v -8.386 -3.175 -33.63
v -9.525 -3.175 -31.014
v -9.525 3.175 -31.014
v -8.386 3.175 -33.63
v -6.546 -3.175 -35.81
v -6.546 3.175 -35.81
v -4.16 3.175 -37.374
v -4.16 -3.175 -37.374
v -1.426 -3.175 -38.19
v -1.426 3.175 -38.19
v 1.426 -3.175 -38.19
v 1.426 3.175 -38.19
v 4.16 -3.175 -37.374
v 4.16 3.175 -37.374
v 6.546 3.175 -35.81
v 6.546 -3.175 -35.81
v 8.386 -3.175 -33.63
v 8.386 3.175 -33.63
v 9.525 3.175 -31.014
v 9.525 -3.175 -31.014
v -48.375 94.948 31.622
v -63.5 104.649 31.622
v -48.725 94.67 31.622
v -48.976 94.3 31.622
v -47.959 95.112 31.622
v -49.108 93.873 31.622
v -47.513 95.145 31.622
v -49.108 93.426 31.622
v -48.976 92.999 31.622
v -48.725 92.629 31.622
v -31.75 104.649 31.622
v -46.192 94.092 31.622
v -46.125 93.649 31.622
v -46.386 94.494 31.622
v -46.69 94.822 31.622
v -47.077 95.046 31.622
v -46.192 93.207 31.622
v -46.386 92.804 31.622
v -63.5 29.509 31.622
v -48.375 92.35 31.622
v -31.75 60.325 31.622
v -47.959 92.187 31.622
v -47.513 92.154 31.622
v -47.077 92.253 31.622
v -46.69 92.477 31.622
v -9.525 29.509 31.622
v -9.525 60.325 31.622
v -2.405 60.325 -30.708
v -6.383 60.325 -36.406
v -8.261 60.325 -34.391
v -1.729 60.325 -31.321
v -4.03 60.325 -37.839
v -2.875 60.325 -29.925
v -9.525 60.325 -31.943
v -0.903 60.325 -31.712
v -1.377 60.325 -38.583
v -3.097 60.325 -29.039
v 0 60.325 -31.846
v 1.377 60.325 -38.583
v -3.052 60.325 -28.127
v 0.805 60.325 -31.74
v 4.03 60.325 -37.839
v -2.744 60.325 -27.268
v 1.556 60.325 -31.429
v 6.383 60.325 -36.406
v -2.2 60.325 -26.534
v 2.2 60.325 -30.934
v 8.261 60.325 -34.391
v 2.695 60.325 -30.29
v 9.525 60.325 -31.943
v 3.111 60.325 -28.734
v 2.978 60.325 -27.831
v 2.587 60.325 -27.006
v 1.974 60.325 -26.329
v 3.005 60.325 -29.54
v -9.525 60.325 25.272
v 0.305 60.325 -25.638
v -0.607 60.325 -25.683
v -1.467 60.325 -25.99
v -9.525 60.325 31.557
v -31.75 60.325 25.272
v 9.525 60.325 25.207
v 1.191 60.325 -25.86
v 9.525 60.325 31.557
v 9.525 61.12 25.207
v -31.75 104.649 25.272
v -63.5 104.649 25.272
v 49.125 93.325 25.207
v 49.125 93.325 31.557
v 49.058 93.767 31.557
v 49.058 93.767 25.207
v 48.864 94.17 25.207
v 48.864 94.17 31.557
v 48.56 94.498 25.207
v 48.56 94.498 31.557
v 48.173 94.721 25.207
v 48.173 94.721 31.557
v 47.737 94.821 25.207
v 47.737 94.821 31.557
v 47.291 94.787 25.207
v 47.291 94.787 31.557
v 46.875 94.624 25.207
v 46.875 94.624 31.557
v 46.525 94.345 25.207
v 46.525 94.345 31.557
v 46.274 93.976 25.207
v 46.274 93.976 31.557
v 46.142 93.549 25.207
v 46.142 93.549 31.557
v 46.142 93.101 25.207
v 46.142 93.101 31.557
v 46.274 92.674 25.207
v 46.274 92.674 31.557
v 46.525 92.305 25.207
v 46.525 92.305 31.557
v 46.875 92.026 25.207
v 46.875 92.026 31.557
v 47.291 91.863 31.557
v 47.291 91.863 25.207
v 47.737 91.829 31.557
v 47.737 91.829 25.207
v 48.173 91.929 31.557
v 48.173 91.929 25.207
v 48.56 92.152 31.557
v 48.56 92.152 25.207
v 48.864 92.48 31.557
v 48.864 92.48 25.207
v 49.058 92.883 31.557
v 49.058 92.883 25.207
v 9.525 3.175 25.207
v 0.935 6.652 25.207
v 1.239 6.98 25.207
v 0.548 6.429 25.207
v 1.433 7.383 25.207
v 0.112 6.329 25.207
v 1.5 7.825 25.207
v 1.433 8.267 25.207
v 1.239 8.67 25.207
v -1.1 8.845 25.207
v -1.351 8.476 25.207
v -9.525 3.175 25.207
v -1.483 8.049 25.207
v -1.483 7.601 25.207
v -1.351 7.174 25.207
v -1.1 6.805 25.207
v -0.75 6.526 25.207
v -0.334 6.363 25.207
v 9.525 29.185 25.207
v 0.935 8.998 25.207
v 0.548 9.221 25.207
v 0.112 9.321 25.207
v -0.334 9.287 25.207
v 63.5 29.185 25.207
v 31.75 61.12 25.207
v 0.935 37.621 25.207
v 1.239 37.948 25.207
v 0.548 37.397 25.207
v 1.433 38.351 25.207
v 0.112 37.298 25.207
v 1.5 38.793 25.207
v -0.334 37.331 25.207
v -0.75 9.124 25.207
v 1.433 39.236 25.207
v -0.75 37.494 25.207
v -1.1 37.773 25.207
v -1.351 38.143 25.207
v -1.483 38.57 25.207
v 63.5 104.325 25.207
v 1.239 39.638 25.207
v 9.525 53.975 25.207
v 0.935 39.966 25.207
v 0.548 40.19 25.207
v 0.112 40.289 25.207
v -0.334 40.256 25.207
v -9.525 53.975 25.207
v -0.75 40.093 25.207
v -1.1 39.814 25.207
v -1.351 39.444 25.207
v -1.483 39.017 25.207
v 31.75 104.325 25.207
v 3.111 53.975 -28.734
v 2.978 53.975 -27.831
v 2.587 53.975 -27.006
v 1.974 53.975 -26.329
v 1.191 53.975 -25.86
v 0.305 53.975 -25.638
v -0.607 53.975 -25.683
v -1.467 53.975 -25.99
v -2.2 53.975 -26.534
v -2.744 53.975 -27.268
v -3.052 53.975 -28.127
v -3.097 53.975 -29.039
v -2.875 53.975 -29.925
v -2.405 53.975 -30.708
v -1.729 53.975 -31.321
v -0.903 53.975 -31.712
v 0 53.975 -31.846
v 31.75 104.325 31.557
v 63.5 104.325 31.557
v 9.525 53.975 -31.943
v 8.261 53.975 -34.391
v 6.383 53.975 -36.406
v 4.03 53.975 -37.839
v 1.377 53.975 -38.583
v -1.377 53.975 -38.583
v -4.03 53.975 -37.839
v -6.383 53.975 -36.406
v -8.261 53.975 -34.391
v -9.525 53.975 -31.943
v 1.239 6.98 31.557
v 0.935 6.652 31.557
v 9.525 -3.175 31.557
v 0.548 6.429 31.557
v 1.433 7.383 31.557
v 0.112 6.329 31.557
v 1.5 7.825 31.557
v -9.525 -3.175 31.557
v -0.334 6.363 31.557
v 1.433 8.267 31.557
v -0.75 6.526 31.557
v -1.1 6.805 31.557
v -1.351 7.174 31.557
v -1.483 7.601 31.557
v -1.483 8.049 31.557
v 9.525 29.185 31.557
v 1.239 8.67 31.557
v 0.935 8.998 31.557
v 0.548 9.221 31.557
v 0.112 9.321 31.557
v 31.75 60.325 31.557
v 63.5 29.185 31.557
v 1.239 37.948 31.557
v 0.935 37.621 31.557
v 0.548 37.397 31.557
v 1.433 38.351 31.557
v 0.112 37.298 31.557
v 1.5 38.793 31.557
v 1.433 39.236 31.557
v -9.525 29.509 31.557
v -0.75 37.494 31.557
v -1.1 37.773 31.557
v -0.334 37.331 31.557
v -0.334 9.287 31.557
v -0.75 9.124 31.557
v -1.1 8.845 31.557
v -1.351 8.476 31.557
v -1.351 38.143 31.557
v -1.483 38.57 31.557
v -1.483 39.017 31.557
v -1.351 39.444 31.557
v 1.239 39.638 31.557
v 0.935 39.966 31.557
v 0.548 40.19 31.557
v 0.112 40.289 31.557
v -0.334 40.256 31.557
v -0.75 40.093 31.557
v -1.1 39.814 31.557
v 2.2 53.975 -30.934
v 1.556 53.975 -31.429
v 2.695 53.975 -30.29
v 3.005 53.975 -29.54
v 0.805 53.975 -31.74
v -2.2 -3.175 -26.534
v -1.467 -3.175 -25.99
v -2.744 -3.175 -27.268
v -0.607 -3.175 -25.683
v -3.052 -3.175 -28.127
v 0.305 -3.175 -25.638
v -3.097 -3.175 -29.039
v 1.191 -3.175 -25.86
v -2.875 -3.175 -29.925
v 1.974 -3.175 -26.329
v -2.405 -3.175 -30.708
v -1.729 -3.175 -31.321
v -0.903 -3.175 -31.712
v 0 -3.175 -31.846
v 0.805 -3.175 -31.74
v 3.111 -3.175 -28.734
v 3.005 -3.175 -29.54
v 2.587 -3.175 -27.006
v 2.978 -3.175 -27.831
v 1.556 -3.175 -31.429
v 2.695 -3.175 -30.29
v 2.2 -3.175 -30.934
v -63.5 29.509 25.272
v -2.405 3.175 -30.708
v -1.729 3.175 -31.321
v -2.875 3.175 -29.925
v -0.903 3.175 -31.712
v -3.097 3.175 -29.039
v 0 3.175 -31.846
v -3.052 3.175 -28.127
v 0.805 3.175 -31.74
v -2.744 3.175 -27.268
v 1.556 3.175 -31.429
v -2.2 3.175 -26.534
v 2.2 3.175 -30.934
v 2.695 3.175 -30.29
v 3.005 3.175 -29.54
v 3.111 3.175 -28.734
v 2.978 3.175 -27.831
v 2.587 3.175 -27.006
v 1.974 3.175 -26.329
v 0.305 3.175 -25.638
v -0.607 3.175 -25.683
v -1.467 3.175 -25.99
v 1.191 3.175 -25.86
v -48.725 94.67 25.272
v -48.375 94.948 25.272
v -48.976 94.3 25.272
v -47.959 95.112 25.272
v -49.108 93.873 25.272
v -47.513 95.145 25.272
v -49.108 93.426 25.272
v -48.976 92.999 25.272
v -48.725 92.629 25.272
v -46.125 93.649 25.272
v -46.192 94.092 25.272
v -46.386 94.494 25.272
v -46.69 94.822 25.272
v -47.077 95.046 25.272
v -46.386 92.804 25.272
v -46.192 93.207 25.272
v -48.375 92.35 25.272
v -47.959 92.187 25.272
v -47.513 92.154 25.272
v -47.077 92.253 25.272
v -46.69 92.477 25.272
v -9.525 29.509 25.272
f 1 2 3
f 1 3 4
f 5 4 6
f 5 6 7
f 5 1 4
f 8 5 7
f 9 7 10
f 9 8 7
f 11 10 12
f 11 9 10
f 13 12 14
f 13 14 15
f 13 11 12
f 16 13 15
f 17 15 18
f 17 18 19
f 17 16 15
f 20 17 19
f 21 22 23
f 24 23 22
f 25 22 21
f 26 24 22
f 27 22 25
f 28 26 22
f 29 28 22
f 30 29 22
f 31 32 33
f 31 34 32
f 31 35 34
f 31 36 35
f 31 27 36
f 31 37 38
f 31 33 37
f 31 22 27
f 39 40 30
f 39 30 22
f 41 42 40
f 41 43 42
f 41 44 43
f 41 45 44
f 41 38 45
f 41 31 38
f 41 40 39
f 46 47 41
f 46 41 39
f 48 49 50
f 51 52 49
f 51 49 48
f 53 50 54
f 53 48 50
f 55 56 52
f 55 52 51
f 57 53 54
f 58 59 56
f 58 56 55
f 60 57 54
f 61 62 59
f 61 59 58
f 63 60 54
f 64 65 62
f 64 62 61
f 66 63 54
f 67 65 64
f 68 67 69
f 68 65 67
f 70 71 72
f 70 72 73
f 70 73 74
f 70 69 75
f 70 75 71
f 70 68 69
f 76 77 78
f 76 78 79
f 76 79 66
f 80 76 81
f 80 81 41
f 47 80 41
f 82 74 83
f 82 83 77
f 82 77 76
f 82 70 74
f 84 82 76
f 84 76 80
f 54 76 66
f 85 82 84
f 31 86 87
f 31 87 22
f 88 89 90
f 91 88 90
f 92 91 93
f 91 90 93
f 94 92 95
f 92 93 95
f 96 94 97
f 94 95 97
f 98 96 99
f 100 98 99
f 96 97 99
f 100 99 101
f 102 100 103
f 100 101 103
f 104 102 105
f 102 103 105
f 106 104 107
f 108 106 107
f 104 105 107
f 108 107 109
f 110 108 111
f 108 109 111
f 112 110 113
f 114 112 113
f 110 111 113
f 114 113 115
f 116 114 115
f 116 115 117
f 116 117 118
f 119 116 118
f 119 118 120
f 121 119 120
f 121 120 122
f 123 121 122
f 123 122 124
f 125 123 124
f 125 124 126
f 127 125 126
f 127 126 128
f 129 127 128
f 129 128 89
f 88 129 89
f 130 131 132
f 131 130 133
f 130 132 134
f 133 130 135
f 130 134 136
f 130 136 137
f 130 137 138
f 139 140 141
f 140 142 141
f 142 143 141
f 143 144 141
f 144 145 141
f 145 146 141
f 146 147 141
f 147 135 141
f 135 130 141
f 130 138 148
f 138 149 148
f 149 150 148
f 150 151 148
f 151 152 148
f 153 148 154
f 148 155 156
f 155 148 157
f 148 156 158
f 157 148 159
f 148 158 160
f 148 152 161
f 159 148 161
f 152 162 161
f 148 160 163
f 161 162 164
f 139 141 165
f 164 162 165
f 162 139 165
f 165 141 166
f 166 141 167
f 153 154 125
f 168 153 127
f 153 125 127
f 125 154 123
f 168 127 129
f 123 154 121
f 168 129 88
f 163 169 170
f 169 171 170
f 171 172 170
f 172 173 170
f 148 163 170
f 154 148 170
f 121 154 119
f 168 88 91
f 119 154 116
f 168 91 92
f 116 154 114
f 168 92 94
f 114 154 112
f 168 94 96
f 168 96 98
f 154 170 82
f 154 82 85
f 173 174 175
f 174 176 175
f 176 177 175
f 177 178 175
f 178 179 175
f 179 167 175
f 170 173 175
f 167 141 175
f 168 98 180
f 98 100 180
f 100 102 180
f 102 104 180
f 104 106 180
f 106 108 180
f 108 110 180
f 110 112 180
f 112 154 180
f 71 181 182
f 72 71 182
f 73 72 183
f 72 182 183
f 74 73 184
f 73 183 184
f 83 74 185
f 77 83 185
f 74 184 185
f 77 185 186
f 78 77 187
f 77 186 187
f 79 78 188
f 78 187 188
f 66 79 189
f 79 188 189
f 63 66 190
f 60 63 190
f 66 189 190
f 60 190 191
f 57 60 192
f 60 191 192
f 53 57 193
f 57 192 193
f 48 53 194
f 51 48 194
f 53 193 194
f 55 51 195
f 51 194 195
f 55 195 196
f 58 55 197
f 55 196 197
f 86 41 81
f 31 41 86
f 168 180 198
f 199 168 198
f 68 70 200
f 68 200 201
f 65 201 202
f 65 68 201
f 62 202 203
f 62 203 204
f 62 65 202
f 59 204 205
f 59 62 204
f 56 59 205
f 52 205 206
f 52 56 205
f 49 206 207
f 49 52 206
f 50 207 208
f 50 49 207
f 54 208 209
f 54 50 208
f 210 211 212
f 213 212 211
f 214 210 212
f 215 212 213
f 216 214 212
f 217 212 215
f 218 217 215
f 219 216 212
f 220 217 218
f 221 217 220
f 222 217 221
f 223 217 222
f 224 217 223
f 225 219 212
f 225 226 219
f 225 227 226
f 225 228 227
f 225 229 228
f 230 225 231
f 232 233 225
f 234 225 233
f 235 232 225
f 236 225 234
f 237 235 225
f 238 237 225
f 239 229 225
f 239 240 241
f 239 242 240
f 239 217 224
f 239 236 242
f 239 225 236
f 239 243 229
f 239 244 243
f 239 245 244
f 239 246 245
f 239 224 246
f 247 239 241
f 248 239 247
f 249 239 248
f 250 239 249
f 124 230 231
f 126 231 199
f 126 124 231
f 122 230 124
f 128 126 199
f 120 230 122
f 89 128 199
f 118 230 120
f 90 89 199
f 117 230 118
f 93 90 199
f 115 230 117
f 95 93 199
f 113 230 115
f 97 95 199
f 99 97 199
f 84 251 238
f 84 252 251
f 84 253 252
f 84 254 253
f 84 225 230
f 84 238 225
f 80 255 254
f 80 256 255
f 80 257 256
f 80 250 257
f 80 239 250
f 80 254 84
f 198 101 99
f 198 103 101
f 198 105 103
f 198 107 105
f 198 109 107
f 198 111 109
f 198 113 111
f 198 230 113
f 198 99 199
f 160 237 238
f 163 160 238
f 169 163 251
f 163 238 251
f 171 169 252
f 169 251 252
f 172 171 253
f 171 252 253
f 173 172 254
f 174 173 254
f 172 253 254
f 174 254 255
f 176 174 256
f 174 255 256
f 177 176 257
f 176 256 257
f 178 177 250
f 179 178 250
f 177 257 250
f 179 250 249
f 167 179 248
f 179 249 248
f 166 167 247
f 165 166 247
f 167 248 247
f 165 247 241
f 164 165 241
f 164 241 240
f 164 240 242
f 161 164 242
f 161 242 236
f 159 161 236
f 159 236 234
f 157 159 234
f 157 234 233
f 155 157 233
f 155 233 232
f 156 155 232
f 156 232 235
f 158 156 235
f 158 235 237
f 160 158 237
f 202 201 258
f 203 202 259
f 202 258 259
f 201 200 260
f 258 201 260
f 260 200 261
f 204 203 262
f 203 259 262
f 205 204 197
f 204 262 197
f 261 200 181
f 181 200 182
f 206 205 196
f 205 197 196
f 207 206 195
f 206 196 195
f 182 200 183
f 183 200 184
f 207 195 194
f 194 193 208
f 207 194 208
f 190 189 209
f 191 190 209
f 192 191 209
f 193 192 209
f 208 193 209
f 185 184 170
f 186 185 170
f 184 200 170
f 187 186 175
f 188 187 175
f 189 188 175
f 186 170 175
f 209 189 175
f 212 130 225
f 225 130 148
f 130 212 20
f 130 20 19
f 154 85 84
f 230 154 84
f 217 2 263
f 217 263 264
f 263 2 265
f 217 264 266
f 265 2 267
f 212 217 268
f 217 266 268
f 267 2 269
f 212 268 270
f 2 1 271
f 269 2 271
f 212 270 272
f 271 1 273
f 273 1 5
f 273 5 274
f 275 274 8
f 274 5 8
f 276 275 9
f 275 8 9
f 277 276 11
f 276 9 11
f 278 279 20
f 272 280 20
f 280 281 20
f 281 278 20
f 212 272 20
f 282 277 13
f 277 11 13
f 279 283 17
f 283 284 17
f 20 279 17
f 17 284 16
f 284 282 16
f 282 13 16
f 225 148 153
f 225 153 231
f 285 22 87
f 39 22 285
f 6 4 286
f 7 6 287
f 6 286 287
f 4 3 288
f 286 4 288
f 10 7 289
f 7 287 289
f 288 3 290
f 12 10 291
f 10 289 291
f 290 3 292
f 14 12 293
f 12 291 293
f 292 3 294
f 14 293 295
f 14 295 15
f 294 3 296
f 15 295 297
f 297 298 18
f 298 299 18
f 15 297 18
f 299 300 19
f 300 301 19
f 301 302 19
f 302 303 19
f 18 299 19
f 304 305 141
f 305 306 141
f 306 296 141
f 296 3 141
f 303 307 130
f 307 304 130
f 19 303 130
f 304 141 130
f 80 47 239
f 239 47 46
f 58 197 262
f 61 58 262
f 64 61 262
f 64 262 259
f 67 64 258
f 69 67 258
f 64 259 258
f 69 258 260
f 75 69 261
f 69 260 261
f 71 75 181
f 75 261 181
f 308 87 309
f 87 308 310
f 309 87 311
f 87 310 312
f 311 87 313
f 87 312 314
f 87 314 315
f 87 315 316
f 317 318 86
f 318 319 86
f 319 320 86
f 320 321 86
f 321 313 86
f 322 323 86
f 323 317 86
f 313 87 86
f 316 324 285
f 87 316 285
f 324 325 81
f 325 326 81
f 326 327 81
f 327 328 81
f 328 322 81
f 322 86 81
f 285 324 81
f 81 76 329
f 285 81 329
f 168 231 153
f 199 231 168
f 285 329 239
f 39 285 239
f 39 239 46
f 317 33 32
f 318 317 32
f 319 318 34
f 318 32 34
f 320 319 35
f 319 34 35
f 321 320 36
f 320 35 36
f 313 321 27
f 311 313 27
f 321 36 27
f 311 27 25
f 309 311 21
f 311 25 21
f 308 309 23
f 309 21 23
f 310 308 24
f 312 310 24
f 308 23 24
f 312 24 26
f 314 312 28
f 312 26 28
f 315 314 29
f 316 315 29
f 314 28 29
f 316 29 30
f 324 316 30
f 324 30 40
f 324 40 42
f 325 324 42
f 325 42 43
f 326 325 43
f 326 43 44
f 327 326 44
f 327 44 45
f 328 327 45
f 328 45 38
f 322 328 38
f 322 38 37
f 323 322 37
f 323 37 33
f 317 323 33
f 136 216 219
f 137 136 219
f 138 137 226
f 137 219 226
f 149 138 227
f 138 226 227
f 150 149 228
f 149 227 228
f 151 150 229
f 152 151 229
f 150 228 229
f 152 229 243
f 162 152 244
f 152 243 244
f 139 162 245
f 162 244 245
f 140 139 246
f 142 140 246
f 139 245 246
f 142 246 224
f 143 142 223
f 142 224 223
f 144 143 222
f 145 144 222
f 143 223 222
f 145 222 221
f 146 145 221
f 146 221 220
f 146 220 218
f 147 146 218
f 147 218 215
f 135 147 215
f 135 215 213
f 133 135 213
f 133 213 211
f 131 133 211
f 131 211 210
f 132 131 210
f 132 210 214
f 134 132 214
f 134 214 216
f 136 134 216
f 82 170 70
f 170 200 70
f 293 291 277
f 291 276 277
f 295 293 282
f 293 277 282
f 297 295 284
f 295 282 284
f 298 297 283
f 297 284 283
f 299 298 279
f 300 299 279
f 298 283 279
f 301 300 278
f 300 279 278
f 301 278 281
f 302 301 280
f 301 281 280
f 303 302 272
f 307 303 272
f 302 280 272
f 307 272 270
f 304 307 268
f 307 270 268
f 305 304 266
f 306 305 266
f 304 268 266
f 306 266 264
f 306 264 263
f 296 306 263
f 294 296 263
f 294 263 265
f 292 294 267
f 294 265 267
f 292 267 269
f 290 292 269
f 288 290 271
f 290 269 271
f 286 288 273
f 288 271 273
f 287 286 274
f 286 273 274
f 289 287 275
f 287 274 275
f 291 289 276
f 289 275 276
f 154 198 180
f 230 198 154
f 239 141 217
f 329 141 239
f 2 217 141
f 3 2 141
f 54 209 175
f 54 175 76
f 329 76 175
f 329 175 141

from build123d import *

# Parameters (mm, degrees)
F1_DEPTH  = 3.175
F2_DEPTH  = 3.175
F4_DEPTH  = 25.4
F5_DEPTH  = 25.4
F6_W      = 19.05
F6_H      = 63.5
F7_DEPTH  = 6.35
F9_DEPTH  = 6.35
F10_DEPTH = 2540
F11_R     = 1.5
F12_DEPTH = 25.4
F13_W     = 75.1403903484
F13_H     = 6.35
F14_DEPTH = 53.975
F15_R     = 1.5
F16_DEPTH = 25
F17_W     = 75.1403903484
F17_H     = 6.35
F18_DEPTH = 53.975
F19_R     = 1.5
F20_DEPTH = 25
F22_DEPTH = 22.225
F23_W     = 44.3243741632
F23_H     = 6.35
F24_DEPTH = 22.225


# Not quite as in the source:
# - a length typed as a fraction of an inch, garbled in the dataset ("3 / 203.2 mm" for 3/8 in), is restored


with BuildPart() as f1:
    # F0 (on Front) → F1 (new body)
    with BuildSketch(Plane.XZ):
        with BuildLine():
            Line((9.525, 25.206619263), (-9.525, 25.206619263))
            Line((-9.525, 25.206619263), (-9.525, -31.0143064708))
            ThreePointArc((-9.525, -31.0143064708), (0, -38.293380737), (9.525, -31.0143064708))
            Line((9.525, -31.0143064708), (9.525, 25.206619263))
        make_face()
    extrude(amount=F1_DEPTH)

    # F0 (on Front) → F2 (join)
    with BuildSketch(Plane.XZ):
        with BuildLine():
            Line((9.525, 25.206619263), (-9.525, 25.206619263))
            Line((-9.525, 25.206619263), (-9.525, -31.0143064708))
            ThreePointArc((-9.525, -31.0143064708), (0, -38.293380737), (9.525, -31.0143064708))
            Line((9.525, -31.0143064708), (9.525, 25.206619263))
        make_face()
    extrude(amount=-F2_DEPTH)

    # F3 (on Front) → F4 (cut)
    with BuildSketch(Plane.XZ):
        with BuildLine():
            ThreePointArc((0, -31.845793884), (2.2001627497, -30.9344566337), (3.1115, -28.734293884))
            ThreePointArc((3.1115, -28.734293884), (-2.2001627497, -26.5341311344), (0, -31.845793884))
        make_face()
    extrude(amount=-F4_DEPTH, mode=Mode.SUBTRACT)

    # F3 (on Front) → F5 (cut)
    with BuildSketch(Plane.XZ):
        with BuildLine():
            ThreePointArc((0, -31.845793884), (2.2001627497, -30.9344566337), (3.1115, -28.734293884))
            ThreePointArc((3.1115, -28.734293884), (-2.2001627497, -26.5341311344), (0, -31.845793884))
        make_face()
    extrude(amount=F5_DEPTH, mode=Mode.SUBTRACT)

    # F6 (on face) → F7 (join)
    with BuildSketch(Plane.XY.offset(25.206619263)):
        with Locations((0, 28.575)):
            Rectangle(F6_W, F6_H)
    extrude(amount=F7_DEPTH)

    # F11 (on face) → F12 (cut)
    with BuildSketch(Plane.XY.offset(31.556619263)):
        with Locations((0, 7.825)):
            Circle(F11_R)
        with Locations((0, 38.7934744358)):
            Circle(F11_R)
    extrude(amount=-F12_DEPTH, mode=Mode.SUBTRACT)



with BuildPart() as f9:
    # F8 (on face) → F9 (new body)
    with BuildSketch(Plane(origin=(0, 60.325, 0), x_dir=(-1, 0, 0), z_dir=(0, 1, 0))):
        with BuildLine():
            Line((-9.525, 31.556619263), (-9.525, -31.943380737))
            ThreePointArc((-9.525, -31.943380737), (0, -38.6772559995), (9.525, -31.943380737))
            Line((9.525, -31.943380737), (9.525, 31.556619263))
            Line((9.525, 31.556619263), (-9.525, 31.556619263))
        make_face()
    extrude(amount=-F9_DEPTH)

    # F3 (on Front) → F10 (cut)
    with BuildSketch(Plane.XZ):
        with BuildLine():
            ThreePointArc((0, -31.845793884), (2.2001627497, -30.9344566337), (3.1115, -28.734293884))
            ThreePointArc((3.1115, -28.734293884), (-2.2001627497, -26.5341311344), (0, -31.845793884))
        make_face()
    extrude(amount=-F10_DEPTH, mode=Mode.SUBTRACT)


with BuildPart() as f1_1:
    add(f1.part)

    add(f9.part)  # F14 merges F9
    # F13 (on face) → F14 (join)
    with BuildSketch(Plane.YZ.offset(9.525)):
        with Locations((66.7548048258, 28.381619263)):
            Rectangle(F13_W, F13_H)
    extrude(amount=F14_DEPTH)

    # F15 (on face) → F16 (cut)
    with BuildSketch(Plane.XY.offset(31.556619263)):
        with Locations((47.625, 93.325)):
            Circle(F15_R)
    extrude(amount=-F16_DEPTH, mode=Mode.SUBTRACT)

    # F17 (on face) → F18 (join)
    with BuildSketch(Plane(origin=(-9.525, 0, 0), x_dir=(0, -1, 0), z_dir=(-1, 0, 0))):
        with Locations((-67.0791789889, 28.4469667822)):
            Rectangle(F17_W, F17_H)
    extrude(amount=F18_DEPTH)

    # F19 (on face) → F20 (cut)
    with BuildSketch(Plane.XY.offset(31.6219667822)):
        with Locations((-47.625, 93.6493741632)):
            Circle(F19_R)
    extrude(amount=-F20_DEPTH, mode=Mode.SUBTRACT)

    # F21 (on face) → F22 (cut)
    with BuildSketch(Plane(origin=(9.525, 0, 0), x_dir=(0, -1, 0), z_dir=(-1, 0, 0))):
        Polygon((-104.325, 31.556619263), (-104.325, 25.206619263), (-61.1199513078, 25.206619263), (-60.325, 31.556619263), align=None)
    extrude(amount=-F22_DEPTH, mode=Mode.SUBTRACT)

    # F23 (on face) → F24 (cut)
    with BuildSketch(Plane.YZ.offset(-9.525)):
        with Locations((82.4871870816, 28.4469667822)):
            Rectangle(F23_W, F23_H)
    extrude(amount=-F24_DEPTH, mode=Mode.SUBTRACT)


solid = f1_1.part
